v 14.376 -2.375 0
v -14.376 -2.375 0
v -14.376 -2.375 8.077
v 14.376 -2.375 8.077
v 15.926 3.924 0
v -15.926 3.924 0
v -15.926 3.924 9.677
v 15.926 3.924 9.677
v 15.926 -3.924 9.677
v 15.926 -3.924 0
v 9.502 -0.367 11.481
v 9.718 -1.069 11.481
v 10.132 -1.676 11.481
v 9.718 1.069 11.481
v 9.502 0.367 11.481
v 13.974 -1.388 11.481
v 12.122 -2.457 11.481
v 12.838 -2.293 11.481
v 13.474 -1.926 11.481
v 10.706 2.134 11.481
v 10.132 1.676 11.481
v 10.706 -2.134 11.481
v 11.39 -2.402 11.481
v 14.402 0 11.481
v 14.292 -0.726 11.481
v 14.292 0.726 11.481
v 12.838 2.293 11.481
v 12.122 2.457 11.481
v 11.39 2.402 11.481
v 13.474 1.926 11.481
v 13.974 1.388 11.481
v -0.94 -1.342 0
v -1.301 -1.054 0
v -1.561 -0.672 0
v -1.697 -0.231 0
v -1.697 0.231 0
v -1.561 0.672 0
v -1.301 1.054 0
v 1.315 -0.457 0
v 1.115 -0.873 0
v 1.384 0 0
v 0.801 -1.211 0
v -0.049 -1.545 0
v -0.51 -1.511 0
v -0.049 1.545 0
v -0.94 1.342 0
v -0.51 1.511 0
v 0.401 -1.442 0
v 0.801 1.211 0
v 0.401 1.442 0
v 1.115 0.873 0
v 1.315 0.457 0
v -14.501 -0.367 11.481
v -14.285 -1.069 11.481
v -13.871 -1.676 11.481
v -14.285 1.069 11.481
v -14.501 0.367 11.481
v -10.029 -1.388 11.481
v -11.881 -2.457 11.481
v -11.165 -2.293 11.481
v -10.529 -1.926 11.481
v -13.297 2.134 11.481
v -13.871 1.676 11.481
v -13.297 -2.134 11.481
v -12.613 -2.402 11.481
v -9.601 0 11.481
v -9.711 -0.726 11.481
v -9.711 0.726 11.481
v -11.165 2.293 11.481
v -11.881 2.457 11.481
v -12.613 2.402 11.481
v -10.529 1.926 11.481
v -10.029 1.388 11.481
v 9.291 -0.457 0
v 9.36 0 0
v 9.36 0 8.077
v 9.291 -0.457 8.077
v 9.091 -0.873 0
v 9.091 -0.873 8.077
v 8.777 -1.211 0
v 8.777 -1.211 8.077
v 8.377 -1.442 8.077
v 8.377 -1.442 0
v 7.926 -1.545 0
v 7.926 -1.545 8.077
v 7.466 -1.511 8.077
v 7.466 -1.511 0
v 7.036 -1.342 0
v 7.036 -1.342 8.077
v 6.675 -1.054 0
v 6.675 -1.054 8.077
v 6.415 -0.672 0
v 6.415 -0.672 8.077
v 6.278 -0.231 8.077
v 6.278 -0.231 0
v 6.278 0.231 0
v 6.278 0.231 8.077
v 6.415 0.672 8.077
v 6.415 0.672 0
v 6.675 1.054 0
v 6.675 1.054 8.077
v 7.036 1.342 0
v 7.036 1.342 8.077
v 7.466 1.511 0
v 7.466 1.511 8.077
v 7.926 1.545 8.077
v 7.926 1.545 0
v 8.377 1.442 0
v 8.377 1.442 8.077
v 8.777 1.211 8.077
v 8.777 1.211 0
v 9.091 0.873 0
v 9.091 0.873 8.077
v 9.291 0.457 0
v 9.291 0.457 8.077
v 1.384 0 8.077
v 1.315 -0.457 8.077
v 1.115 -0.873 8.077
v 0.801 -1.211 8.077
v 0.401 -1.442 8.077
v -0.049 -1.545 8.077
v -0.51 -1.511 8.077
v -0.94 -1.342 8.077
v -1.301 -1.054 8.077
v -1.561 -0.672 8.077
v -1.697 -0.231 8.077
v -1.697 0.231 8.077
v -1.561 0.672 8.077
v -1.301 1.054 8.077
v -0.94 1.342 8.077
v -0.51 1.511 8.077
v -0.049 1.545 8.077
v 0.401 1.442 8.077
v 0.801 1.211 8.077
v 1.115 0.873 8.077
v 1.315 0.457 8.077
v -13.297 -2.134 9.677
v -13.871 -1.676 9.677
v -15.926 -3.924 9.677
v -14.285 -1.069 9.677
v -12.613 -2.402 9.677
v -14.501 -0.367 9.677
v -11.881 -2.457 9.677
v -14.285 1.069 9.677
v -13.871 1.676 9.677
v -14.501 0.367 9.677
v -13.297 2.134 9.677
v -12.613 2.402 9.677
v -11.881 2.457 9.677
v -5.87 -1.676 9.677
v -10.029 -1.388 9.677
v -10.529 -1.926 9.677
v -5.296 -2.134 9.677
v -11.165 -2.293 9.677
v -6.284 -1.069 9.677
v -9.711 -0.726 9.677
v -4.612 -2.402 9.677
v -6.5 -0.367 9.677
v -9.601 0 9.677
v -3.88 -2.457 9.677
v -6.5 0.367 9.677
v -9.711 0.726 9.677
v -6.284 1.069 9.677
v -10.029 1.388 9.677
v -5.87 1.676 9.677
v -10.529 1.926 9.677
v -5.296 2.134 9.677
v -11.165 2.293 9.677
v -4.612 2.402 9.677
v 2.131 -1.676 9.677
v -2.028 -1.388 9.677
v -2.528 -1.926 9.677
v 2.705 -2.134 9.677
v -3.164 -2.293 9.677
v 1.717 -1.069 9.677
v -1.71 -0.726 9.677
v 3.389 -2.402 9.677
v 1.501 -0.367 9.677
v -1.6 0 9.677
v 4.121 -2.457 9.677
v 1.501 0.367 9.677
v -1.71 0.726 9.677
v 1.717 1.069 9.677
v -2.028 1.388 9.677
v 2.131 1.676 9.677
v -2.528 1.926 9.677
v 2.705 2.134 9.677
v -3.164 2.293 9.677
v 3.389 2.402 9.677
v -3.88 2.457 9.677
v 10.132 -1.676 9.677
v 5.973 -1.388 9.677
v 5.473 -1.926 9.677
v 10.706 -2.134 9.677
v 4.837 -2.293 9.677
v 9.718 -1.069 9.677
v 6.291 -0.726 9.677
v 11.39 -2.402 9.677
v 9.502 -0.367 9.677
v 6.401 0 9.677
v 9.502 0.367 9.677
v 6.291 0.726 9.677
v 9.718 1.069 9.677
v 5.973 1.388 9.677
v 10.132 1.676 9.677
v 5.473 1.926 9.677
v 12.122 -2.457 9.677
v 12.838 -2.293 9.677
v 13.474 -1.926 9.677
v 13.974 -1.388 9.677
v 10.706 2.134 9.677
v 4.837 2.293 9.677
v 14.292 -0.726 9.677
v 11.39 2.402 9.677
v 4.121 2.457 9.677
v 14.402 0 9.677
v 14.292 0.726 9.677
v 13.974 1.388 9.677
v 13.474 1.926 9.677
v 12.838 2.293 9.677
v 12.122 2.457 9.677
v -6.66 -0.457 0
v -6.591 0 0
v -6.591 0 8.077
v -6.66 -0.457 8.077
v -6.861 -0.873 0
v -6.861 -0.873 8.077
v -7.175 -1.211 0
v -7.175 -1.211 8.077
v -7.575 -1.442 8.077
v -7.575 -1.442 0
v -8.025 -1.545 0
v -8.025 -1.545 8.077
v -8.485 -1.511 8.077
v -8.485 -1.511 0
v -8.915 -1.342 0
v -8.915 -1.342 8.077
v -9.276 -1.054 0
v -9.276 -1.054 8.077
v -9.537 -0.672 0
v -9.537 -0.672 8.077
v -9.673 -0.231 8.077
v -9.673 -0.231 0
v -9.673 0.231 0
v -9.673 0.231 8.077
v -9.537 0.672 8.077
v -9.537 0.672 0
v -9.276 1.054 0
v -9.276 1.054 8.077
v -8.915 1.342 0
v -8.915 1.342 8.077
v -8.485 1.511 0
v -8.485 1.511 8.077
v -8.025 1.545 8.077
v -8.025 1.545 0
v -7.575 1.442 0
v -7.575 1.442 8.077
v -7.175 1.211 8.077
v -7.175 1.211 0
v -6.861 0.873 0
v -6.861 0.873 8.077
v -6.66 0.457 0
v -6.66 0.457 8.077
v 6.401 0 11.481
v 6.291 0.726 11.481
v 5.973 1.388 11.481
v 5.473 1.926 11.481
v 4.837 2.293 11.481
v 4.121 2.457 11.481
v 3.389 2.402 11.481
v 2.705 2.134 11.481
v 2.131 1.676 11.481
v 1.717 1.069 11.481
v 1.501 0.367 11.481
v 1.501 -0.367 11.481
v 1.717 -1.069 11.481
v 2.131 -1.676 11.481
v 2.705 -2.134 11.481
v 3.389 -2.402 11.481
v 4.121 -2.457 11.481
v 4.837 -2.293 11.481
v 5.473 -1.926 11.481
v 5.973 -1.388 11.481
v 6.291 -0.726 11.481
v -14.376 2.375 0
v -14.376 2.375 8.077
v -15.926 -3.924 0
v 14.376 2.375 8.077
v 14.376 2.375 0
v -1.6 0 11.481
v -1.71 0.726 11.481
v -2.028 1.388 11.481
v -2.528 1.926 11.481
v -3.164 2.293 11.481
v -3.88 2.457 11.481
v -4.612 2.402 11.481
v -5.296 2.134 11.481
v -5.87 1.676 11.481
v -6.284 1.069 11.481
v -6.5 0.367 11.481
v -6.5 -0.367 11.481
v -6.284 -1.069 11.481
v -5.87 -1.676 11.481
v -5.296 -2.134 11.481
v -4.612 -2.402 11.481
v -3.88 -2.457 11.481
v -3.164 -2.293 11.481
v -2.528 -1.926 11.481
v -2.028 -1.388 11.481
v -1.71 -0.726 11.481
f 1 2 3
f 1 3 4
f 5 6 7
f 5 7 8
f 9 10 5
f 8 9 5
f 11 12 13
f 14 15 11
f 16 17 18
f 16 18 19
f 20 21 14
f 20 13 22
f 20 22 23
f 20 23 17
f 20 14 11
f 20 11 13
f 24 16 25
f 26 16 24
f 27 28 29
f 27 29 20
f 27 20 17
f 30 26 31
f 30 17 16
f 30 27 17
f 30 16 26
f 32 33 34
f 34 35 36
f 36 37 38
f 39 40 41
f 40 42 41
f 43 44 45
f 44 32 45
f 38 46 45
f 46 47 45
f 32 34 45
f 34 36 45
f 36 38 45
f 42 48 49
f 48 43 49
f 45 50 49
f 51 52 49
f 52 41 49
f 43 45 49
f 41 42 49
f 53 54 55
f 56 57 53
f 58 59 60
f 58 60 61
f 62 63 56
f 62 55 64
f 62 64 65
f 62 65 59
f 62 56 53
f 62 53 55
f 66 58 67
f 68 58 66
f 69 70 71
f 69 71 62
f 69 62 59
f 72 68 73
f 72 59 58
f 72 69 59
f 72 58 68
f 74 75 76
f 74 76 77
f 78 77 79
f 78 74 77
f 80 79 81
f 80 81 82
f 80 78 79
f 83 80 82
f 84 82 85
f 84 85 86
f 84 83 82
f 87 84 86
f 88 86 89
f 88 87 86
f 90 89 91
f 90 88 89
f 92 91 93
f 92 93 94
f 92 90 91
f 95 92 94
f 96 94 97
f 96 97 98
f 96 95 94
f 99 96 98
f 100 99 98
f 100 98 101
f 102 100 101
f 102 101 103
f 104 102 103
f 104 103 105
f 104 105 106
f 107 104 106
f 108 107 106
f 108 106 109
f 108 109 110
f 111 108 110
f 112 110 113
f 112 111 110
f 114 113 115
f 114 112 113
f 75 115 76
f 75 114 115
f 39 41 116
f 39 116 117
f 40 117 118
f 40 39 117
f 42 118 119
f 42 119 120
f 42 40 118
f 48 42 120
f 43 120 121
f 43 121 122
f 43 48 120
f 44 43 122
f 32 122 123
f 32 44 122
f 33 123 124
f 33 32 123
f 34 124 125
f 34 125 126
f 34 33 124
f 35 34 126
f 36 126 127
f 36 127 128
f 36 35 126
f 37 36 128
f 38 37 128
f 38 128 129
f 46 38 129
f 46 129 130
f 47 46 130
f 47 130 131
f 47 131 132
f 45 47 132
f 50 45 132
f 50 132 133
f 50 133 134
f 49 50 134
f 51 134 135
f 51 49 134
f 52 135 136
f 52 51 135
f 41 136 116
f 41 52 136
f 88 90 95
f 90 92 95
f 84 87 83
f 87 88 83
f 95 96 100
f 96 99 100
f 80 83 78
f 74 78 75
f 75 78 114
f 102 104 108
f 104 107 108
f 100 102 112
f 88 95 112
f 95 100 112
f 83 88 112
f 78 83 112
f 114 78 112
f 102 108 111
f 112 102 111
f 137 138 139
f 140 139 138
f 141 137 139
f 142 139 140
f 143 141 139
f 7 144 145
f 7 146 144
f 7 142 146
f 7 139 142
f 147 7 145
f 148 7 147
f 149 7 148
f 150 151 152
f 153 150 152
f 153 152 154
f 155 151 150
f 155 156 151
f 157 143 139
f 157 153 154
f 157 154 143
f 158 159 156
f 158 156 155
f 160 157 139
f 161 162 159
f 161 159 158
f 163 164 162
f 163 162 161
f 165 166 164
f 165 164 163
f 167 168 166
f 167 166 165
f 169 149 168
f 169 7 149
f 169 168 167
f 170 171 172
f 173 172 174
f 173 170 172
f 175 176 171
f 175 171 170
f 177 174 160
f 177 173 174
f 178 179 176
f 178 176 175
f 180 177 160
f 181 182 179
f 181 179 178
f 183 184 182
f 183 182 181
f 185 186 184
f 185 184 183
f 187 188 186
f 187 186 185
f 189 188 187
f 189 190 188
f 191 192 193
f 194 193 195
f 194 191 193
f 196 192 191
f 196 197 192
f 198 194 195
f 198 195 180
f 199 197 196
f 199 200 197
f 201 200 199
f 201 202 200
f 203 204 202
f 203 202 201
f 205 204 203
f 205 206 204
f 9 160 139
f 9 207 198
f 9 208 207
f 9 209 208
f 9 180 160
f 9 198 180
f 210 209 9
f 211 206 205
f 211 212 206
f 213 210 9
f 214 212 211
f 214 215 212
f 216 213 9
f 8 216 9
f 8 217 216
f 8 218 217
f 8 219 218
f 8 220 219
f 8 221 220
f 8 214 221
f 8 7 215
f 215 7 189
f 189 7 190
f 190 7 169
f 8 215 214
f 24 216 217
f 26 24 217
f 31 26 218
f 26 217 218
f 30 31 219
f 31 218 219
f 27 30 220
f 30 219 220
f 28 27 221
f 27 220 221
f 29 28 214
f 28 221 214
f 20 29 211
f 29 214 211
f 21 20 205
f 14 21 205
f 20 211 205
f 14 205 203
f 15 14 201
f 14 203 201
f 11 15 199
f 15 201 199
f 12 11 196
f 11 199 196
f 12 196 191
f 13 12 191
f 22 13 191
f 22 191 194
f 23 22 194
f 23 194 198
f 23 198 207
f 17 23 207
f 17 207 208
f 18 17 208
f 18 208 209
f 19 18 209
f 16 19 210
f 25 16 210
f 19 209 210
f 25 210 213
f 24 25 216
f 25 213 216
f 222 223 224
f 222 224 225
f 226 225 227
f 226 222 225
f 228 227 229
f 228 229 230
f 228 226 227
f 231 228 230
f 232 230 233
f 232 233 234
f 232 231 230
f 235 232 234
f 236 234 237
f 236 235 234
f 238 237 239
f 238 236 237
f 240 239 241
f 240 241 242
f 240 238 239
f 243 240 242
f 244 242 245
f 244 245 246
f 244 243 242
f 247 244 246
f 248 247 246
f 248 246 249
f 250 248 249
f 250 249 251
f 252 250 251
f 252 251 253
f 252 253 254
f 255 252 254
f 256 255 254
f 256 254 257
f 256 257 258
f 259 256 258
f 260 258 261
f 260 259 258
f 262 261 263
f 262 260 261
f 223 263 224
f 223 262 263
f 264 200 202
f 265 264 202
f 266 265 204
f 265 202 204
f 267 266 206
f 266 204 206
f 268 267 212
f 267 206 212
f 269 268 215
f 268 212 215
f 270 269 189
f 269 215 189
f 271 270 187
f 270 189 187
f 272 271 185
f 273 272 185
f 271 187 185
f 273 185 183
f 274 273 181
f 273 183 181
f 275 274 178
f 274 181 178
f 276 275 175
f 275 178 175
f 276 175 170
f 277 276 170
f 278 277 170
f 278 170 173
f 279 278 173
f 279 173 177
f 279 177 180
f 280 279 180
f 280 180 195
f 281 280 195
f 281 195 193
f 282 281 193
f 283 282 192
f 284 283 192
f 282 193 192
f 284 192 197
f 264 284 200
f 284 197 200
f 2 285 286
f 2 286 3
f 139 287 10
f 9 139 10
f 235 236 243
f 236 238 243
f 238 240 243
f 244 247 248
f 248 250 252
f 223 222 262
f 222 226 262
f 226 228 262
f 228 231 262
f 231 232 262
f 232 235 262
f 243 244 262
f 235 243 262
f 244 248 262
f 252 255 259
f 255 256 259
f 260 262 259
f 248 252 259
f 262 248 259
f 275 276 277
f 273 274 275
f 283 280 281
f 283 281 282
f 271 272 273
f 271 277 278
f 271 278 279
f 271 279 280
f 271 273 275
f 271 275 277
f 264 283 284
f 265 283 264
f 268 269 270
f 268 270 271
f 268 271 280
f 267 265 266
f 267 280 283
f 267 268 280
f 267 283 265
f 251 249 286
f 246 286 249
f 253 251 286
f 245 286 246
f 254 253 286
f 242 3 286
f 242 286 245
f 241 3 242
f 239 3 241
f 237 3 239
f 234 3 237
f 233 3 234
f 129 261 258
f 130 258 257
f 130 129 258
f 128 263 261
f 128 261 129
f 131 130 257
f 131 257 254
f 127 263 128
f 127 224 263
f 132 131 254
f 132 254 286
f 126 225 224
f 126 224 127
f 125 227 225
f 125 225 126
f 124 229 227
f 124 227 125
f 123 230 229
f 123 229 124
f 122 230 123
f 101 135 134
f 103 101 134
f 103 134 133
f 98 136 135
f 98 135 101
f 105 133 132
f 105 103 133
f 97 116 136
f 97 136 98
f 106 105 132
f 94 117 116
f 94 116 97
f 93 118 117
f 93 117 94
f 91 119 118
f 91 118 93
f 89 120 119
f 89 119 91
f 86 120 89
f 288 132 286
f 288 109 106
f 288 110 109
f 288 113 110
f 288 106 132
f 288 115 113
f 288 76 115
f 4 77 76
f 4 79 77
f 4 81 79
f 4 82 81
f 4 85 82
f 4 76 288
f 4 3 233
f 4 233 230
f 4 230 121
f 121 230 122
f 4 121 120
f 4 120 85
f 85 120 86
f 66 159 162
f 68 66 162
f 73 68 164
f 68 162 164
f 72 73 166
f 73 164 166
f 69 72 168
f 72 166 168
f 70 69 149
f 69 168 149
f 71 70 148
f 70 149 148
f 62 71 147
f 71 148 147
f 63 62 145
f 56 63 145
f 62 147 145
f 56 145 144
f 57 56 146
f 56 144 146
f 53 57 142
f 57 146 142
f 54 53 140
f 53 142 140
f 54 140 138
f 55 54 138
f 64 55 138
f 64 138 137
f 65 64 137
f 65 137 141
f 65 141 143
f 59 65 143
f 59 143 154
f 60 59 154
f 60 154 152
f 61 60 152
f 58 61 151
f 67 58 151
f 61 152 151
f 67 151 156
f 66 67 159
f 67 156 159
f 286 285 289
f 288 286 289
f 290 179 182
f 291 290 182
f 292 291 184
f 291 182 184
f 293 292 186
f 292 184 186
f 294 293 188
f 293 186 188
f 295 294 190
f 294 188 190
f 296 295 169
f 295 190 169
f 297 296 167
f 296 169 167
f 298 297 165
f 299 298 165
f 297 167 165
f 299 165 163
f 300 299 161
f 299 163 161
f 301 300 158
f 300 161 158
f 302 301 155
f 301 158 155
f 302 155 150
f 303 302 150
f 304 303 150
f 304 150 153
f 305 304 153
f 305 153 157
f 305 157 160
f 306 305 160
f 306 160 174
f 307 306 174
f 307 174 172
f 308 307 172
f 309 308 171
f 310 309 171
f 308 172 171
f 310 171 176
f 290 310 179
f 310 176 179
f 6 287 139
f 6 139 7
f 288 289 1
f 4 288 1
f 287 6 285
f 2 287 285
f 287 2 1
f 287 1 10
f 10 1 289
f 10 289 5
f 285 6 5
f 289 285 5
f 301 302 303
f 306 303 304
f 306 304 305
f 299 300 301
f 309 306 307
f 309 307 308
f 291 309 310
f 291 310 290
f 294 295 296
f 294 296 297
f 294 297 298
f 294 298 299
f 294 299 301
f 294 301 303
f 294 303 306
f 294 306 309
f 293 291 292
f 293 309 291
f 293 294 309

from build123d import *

# Parameters (mm, degrees)
F0_W     = 31.8516
F0_H     = 7.8486
F1_DEPTH = 9.6774
F2_R     = 2.4638
F3_DEPTH = 1.8034
F5_W     = 28.7528
F5_H     = 4.7498
F5_R     = 1.5494
F6_DEPTH = 8.0772


with BuildPart() as f1:
    # F0 (on Top) → F1 (new body)
    with BuildSketch(Plane.XY):
        Rectangle(F0_W, F0_H)
    extrude(amount=F1_DEPTH)

    # F2 (on face) → F3 (join)
    with BuildSketch(Plane.XY.offset(9.6774)):
        with Locations((-4.064, 0)):
            Circle(F2_R)
        with Locations((3.937, 0)):
            Circle(F2_R)
        with Locations((11.938, 0)):
            Circle(F2_R)
        with Locations((-12.065, 0)):
            Circle(F2_R)
    extrude(amount=F3_DEPTH)

    # F5 (on face) → F6 (cut)
    with BuildSketch(Plane(origin=(0, 0, 0), x_dir=(1, 0, 0), z_dir=(0, 0, -1))):
        Rectangle(F5_W, F5_H)
        with Locations((-8.1407, 0)):
            Circle(F5_R, mode=Mode.SUBTRACT)
        with Locations((-0.1651, 0)):
            Circle(F5_R, mode=Mode.SUBTRACT)
        with Locations((7.8105, 0)):
            Circle(F5_R, mode=Mode.SUBTRACT)
    extrude(amount=-F6_DEPTH, mode=Mode.SUBTRACT)


solid = f1.part
